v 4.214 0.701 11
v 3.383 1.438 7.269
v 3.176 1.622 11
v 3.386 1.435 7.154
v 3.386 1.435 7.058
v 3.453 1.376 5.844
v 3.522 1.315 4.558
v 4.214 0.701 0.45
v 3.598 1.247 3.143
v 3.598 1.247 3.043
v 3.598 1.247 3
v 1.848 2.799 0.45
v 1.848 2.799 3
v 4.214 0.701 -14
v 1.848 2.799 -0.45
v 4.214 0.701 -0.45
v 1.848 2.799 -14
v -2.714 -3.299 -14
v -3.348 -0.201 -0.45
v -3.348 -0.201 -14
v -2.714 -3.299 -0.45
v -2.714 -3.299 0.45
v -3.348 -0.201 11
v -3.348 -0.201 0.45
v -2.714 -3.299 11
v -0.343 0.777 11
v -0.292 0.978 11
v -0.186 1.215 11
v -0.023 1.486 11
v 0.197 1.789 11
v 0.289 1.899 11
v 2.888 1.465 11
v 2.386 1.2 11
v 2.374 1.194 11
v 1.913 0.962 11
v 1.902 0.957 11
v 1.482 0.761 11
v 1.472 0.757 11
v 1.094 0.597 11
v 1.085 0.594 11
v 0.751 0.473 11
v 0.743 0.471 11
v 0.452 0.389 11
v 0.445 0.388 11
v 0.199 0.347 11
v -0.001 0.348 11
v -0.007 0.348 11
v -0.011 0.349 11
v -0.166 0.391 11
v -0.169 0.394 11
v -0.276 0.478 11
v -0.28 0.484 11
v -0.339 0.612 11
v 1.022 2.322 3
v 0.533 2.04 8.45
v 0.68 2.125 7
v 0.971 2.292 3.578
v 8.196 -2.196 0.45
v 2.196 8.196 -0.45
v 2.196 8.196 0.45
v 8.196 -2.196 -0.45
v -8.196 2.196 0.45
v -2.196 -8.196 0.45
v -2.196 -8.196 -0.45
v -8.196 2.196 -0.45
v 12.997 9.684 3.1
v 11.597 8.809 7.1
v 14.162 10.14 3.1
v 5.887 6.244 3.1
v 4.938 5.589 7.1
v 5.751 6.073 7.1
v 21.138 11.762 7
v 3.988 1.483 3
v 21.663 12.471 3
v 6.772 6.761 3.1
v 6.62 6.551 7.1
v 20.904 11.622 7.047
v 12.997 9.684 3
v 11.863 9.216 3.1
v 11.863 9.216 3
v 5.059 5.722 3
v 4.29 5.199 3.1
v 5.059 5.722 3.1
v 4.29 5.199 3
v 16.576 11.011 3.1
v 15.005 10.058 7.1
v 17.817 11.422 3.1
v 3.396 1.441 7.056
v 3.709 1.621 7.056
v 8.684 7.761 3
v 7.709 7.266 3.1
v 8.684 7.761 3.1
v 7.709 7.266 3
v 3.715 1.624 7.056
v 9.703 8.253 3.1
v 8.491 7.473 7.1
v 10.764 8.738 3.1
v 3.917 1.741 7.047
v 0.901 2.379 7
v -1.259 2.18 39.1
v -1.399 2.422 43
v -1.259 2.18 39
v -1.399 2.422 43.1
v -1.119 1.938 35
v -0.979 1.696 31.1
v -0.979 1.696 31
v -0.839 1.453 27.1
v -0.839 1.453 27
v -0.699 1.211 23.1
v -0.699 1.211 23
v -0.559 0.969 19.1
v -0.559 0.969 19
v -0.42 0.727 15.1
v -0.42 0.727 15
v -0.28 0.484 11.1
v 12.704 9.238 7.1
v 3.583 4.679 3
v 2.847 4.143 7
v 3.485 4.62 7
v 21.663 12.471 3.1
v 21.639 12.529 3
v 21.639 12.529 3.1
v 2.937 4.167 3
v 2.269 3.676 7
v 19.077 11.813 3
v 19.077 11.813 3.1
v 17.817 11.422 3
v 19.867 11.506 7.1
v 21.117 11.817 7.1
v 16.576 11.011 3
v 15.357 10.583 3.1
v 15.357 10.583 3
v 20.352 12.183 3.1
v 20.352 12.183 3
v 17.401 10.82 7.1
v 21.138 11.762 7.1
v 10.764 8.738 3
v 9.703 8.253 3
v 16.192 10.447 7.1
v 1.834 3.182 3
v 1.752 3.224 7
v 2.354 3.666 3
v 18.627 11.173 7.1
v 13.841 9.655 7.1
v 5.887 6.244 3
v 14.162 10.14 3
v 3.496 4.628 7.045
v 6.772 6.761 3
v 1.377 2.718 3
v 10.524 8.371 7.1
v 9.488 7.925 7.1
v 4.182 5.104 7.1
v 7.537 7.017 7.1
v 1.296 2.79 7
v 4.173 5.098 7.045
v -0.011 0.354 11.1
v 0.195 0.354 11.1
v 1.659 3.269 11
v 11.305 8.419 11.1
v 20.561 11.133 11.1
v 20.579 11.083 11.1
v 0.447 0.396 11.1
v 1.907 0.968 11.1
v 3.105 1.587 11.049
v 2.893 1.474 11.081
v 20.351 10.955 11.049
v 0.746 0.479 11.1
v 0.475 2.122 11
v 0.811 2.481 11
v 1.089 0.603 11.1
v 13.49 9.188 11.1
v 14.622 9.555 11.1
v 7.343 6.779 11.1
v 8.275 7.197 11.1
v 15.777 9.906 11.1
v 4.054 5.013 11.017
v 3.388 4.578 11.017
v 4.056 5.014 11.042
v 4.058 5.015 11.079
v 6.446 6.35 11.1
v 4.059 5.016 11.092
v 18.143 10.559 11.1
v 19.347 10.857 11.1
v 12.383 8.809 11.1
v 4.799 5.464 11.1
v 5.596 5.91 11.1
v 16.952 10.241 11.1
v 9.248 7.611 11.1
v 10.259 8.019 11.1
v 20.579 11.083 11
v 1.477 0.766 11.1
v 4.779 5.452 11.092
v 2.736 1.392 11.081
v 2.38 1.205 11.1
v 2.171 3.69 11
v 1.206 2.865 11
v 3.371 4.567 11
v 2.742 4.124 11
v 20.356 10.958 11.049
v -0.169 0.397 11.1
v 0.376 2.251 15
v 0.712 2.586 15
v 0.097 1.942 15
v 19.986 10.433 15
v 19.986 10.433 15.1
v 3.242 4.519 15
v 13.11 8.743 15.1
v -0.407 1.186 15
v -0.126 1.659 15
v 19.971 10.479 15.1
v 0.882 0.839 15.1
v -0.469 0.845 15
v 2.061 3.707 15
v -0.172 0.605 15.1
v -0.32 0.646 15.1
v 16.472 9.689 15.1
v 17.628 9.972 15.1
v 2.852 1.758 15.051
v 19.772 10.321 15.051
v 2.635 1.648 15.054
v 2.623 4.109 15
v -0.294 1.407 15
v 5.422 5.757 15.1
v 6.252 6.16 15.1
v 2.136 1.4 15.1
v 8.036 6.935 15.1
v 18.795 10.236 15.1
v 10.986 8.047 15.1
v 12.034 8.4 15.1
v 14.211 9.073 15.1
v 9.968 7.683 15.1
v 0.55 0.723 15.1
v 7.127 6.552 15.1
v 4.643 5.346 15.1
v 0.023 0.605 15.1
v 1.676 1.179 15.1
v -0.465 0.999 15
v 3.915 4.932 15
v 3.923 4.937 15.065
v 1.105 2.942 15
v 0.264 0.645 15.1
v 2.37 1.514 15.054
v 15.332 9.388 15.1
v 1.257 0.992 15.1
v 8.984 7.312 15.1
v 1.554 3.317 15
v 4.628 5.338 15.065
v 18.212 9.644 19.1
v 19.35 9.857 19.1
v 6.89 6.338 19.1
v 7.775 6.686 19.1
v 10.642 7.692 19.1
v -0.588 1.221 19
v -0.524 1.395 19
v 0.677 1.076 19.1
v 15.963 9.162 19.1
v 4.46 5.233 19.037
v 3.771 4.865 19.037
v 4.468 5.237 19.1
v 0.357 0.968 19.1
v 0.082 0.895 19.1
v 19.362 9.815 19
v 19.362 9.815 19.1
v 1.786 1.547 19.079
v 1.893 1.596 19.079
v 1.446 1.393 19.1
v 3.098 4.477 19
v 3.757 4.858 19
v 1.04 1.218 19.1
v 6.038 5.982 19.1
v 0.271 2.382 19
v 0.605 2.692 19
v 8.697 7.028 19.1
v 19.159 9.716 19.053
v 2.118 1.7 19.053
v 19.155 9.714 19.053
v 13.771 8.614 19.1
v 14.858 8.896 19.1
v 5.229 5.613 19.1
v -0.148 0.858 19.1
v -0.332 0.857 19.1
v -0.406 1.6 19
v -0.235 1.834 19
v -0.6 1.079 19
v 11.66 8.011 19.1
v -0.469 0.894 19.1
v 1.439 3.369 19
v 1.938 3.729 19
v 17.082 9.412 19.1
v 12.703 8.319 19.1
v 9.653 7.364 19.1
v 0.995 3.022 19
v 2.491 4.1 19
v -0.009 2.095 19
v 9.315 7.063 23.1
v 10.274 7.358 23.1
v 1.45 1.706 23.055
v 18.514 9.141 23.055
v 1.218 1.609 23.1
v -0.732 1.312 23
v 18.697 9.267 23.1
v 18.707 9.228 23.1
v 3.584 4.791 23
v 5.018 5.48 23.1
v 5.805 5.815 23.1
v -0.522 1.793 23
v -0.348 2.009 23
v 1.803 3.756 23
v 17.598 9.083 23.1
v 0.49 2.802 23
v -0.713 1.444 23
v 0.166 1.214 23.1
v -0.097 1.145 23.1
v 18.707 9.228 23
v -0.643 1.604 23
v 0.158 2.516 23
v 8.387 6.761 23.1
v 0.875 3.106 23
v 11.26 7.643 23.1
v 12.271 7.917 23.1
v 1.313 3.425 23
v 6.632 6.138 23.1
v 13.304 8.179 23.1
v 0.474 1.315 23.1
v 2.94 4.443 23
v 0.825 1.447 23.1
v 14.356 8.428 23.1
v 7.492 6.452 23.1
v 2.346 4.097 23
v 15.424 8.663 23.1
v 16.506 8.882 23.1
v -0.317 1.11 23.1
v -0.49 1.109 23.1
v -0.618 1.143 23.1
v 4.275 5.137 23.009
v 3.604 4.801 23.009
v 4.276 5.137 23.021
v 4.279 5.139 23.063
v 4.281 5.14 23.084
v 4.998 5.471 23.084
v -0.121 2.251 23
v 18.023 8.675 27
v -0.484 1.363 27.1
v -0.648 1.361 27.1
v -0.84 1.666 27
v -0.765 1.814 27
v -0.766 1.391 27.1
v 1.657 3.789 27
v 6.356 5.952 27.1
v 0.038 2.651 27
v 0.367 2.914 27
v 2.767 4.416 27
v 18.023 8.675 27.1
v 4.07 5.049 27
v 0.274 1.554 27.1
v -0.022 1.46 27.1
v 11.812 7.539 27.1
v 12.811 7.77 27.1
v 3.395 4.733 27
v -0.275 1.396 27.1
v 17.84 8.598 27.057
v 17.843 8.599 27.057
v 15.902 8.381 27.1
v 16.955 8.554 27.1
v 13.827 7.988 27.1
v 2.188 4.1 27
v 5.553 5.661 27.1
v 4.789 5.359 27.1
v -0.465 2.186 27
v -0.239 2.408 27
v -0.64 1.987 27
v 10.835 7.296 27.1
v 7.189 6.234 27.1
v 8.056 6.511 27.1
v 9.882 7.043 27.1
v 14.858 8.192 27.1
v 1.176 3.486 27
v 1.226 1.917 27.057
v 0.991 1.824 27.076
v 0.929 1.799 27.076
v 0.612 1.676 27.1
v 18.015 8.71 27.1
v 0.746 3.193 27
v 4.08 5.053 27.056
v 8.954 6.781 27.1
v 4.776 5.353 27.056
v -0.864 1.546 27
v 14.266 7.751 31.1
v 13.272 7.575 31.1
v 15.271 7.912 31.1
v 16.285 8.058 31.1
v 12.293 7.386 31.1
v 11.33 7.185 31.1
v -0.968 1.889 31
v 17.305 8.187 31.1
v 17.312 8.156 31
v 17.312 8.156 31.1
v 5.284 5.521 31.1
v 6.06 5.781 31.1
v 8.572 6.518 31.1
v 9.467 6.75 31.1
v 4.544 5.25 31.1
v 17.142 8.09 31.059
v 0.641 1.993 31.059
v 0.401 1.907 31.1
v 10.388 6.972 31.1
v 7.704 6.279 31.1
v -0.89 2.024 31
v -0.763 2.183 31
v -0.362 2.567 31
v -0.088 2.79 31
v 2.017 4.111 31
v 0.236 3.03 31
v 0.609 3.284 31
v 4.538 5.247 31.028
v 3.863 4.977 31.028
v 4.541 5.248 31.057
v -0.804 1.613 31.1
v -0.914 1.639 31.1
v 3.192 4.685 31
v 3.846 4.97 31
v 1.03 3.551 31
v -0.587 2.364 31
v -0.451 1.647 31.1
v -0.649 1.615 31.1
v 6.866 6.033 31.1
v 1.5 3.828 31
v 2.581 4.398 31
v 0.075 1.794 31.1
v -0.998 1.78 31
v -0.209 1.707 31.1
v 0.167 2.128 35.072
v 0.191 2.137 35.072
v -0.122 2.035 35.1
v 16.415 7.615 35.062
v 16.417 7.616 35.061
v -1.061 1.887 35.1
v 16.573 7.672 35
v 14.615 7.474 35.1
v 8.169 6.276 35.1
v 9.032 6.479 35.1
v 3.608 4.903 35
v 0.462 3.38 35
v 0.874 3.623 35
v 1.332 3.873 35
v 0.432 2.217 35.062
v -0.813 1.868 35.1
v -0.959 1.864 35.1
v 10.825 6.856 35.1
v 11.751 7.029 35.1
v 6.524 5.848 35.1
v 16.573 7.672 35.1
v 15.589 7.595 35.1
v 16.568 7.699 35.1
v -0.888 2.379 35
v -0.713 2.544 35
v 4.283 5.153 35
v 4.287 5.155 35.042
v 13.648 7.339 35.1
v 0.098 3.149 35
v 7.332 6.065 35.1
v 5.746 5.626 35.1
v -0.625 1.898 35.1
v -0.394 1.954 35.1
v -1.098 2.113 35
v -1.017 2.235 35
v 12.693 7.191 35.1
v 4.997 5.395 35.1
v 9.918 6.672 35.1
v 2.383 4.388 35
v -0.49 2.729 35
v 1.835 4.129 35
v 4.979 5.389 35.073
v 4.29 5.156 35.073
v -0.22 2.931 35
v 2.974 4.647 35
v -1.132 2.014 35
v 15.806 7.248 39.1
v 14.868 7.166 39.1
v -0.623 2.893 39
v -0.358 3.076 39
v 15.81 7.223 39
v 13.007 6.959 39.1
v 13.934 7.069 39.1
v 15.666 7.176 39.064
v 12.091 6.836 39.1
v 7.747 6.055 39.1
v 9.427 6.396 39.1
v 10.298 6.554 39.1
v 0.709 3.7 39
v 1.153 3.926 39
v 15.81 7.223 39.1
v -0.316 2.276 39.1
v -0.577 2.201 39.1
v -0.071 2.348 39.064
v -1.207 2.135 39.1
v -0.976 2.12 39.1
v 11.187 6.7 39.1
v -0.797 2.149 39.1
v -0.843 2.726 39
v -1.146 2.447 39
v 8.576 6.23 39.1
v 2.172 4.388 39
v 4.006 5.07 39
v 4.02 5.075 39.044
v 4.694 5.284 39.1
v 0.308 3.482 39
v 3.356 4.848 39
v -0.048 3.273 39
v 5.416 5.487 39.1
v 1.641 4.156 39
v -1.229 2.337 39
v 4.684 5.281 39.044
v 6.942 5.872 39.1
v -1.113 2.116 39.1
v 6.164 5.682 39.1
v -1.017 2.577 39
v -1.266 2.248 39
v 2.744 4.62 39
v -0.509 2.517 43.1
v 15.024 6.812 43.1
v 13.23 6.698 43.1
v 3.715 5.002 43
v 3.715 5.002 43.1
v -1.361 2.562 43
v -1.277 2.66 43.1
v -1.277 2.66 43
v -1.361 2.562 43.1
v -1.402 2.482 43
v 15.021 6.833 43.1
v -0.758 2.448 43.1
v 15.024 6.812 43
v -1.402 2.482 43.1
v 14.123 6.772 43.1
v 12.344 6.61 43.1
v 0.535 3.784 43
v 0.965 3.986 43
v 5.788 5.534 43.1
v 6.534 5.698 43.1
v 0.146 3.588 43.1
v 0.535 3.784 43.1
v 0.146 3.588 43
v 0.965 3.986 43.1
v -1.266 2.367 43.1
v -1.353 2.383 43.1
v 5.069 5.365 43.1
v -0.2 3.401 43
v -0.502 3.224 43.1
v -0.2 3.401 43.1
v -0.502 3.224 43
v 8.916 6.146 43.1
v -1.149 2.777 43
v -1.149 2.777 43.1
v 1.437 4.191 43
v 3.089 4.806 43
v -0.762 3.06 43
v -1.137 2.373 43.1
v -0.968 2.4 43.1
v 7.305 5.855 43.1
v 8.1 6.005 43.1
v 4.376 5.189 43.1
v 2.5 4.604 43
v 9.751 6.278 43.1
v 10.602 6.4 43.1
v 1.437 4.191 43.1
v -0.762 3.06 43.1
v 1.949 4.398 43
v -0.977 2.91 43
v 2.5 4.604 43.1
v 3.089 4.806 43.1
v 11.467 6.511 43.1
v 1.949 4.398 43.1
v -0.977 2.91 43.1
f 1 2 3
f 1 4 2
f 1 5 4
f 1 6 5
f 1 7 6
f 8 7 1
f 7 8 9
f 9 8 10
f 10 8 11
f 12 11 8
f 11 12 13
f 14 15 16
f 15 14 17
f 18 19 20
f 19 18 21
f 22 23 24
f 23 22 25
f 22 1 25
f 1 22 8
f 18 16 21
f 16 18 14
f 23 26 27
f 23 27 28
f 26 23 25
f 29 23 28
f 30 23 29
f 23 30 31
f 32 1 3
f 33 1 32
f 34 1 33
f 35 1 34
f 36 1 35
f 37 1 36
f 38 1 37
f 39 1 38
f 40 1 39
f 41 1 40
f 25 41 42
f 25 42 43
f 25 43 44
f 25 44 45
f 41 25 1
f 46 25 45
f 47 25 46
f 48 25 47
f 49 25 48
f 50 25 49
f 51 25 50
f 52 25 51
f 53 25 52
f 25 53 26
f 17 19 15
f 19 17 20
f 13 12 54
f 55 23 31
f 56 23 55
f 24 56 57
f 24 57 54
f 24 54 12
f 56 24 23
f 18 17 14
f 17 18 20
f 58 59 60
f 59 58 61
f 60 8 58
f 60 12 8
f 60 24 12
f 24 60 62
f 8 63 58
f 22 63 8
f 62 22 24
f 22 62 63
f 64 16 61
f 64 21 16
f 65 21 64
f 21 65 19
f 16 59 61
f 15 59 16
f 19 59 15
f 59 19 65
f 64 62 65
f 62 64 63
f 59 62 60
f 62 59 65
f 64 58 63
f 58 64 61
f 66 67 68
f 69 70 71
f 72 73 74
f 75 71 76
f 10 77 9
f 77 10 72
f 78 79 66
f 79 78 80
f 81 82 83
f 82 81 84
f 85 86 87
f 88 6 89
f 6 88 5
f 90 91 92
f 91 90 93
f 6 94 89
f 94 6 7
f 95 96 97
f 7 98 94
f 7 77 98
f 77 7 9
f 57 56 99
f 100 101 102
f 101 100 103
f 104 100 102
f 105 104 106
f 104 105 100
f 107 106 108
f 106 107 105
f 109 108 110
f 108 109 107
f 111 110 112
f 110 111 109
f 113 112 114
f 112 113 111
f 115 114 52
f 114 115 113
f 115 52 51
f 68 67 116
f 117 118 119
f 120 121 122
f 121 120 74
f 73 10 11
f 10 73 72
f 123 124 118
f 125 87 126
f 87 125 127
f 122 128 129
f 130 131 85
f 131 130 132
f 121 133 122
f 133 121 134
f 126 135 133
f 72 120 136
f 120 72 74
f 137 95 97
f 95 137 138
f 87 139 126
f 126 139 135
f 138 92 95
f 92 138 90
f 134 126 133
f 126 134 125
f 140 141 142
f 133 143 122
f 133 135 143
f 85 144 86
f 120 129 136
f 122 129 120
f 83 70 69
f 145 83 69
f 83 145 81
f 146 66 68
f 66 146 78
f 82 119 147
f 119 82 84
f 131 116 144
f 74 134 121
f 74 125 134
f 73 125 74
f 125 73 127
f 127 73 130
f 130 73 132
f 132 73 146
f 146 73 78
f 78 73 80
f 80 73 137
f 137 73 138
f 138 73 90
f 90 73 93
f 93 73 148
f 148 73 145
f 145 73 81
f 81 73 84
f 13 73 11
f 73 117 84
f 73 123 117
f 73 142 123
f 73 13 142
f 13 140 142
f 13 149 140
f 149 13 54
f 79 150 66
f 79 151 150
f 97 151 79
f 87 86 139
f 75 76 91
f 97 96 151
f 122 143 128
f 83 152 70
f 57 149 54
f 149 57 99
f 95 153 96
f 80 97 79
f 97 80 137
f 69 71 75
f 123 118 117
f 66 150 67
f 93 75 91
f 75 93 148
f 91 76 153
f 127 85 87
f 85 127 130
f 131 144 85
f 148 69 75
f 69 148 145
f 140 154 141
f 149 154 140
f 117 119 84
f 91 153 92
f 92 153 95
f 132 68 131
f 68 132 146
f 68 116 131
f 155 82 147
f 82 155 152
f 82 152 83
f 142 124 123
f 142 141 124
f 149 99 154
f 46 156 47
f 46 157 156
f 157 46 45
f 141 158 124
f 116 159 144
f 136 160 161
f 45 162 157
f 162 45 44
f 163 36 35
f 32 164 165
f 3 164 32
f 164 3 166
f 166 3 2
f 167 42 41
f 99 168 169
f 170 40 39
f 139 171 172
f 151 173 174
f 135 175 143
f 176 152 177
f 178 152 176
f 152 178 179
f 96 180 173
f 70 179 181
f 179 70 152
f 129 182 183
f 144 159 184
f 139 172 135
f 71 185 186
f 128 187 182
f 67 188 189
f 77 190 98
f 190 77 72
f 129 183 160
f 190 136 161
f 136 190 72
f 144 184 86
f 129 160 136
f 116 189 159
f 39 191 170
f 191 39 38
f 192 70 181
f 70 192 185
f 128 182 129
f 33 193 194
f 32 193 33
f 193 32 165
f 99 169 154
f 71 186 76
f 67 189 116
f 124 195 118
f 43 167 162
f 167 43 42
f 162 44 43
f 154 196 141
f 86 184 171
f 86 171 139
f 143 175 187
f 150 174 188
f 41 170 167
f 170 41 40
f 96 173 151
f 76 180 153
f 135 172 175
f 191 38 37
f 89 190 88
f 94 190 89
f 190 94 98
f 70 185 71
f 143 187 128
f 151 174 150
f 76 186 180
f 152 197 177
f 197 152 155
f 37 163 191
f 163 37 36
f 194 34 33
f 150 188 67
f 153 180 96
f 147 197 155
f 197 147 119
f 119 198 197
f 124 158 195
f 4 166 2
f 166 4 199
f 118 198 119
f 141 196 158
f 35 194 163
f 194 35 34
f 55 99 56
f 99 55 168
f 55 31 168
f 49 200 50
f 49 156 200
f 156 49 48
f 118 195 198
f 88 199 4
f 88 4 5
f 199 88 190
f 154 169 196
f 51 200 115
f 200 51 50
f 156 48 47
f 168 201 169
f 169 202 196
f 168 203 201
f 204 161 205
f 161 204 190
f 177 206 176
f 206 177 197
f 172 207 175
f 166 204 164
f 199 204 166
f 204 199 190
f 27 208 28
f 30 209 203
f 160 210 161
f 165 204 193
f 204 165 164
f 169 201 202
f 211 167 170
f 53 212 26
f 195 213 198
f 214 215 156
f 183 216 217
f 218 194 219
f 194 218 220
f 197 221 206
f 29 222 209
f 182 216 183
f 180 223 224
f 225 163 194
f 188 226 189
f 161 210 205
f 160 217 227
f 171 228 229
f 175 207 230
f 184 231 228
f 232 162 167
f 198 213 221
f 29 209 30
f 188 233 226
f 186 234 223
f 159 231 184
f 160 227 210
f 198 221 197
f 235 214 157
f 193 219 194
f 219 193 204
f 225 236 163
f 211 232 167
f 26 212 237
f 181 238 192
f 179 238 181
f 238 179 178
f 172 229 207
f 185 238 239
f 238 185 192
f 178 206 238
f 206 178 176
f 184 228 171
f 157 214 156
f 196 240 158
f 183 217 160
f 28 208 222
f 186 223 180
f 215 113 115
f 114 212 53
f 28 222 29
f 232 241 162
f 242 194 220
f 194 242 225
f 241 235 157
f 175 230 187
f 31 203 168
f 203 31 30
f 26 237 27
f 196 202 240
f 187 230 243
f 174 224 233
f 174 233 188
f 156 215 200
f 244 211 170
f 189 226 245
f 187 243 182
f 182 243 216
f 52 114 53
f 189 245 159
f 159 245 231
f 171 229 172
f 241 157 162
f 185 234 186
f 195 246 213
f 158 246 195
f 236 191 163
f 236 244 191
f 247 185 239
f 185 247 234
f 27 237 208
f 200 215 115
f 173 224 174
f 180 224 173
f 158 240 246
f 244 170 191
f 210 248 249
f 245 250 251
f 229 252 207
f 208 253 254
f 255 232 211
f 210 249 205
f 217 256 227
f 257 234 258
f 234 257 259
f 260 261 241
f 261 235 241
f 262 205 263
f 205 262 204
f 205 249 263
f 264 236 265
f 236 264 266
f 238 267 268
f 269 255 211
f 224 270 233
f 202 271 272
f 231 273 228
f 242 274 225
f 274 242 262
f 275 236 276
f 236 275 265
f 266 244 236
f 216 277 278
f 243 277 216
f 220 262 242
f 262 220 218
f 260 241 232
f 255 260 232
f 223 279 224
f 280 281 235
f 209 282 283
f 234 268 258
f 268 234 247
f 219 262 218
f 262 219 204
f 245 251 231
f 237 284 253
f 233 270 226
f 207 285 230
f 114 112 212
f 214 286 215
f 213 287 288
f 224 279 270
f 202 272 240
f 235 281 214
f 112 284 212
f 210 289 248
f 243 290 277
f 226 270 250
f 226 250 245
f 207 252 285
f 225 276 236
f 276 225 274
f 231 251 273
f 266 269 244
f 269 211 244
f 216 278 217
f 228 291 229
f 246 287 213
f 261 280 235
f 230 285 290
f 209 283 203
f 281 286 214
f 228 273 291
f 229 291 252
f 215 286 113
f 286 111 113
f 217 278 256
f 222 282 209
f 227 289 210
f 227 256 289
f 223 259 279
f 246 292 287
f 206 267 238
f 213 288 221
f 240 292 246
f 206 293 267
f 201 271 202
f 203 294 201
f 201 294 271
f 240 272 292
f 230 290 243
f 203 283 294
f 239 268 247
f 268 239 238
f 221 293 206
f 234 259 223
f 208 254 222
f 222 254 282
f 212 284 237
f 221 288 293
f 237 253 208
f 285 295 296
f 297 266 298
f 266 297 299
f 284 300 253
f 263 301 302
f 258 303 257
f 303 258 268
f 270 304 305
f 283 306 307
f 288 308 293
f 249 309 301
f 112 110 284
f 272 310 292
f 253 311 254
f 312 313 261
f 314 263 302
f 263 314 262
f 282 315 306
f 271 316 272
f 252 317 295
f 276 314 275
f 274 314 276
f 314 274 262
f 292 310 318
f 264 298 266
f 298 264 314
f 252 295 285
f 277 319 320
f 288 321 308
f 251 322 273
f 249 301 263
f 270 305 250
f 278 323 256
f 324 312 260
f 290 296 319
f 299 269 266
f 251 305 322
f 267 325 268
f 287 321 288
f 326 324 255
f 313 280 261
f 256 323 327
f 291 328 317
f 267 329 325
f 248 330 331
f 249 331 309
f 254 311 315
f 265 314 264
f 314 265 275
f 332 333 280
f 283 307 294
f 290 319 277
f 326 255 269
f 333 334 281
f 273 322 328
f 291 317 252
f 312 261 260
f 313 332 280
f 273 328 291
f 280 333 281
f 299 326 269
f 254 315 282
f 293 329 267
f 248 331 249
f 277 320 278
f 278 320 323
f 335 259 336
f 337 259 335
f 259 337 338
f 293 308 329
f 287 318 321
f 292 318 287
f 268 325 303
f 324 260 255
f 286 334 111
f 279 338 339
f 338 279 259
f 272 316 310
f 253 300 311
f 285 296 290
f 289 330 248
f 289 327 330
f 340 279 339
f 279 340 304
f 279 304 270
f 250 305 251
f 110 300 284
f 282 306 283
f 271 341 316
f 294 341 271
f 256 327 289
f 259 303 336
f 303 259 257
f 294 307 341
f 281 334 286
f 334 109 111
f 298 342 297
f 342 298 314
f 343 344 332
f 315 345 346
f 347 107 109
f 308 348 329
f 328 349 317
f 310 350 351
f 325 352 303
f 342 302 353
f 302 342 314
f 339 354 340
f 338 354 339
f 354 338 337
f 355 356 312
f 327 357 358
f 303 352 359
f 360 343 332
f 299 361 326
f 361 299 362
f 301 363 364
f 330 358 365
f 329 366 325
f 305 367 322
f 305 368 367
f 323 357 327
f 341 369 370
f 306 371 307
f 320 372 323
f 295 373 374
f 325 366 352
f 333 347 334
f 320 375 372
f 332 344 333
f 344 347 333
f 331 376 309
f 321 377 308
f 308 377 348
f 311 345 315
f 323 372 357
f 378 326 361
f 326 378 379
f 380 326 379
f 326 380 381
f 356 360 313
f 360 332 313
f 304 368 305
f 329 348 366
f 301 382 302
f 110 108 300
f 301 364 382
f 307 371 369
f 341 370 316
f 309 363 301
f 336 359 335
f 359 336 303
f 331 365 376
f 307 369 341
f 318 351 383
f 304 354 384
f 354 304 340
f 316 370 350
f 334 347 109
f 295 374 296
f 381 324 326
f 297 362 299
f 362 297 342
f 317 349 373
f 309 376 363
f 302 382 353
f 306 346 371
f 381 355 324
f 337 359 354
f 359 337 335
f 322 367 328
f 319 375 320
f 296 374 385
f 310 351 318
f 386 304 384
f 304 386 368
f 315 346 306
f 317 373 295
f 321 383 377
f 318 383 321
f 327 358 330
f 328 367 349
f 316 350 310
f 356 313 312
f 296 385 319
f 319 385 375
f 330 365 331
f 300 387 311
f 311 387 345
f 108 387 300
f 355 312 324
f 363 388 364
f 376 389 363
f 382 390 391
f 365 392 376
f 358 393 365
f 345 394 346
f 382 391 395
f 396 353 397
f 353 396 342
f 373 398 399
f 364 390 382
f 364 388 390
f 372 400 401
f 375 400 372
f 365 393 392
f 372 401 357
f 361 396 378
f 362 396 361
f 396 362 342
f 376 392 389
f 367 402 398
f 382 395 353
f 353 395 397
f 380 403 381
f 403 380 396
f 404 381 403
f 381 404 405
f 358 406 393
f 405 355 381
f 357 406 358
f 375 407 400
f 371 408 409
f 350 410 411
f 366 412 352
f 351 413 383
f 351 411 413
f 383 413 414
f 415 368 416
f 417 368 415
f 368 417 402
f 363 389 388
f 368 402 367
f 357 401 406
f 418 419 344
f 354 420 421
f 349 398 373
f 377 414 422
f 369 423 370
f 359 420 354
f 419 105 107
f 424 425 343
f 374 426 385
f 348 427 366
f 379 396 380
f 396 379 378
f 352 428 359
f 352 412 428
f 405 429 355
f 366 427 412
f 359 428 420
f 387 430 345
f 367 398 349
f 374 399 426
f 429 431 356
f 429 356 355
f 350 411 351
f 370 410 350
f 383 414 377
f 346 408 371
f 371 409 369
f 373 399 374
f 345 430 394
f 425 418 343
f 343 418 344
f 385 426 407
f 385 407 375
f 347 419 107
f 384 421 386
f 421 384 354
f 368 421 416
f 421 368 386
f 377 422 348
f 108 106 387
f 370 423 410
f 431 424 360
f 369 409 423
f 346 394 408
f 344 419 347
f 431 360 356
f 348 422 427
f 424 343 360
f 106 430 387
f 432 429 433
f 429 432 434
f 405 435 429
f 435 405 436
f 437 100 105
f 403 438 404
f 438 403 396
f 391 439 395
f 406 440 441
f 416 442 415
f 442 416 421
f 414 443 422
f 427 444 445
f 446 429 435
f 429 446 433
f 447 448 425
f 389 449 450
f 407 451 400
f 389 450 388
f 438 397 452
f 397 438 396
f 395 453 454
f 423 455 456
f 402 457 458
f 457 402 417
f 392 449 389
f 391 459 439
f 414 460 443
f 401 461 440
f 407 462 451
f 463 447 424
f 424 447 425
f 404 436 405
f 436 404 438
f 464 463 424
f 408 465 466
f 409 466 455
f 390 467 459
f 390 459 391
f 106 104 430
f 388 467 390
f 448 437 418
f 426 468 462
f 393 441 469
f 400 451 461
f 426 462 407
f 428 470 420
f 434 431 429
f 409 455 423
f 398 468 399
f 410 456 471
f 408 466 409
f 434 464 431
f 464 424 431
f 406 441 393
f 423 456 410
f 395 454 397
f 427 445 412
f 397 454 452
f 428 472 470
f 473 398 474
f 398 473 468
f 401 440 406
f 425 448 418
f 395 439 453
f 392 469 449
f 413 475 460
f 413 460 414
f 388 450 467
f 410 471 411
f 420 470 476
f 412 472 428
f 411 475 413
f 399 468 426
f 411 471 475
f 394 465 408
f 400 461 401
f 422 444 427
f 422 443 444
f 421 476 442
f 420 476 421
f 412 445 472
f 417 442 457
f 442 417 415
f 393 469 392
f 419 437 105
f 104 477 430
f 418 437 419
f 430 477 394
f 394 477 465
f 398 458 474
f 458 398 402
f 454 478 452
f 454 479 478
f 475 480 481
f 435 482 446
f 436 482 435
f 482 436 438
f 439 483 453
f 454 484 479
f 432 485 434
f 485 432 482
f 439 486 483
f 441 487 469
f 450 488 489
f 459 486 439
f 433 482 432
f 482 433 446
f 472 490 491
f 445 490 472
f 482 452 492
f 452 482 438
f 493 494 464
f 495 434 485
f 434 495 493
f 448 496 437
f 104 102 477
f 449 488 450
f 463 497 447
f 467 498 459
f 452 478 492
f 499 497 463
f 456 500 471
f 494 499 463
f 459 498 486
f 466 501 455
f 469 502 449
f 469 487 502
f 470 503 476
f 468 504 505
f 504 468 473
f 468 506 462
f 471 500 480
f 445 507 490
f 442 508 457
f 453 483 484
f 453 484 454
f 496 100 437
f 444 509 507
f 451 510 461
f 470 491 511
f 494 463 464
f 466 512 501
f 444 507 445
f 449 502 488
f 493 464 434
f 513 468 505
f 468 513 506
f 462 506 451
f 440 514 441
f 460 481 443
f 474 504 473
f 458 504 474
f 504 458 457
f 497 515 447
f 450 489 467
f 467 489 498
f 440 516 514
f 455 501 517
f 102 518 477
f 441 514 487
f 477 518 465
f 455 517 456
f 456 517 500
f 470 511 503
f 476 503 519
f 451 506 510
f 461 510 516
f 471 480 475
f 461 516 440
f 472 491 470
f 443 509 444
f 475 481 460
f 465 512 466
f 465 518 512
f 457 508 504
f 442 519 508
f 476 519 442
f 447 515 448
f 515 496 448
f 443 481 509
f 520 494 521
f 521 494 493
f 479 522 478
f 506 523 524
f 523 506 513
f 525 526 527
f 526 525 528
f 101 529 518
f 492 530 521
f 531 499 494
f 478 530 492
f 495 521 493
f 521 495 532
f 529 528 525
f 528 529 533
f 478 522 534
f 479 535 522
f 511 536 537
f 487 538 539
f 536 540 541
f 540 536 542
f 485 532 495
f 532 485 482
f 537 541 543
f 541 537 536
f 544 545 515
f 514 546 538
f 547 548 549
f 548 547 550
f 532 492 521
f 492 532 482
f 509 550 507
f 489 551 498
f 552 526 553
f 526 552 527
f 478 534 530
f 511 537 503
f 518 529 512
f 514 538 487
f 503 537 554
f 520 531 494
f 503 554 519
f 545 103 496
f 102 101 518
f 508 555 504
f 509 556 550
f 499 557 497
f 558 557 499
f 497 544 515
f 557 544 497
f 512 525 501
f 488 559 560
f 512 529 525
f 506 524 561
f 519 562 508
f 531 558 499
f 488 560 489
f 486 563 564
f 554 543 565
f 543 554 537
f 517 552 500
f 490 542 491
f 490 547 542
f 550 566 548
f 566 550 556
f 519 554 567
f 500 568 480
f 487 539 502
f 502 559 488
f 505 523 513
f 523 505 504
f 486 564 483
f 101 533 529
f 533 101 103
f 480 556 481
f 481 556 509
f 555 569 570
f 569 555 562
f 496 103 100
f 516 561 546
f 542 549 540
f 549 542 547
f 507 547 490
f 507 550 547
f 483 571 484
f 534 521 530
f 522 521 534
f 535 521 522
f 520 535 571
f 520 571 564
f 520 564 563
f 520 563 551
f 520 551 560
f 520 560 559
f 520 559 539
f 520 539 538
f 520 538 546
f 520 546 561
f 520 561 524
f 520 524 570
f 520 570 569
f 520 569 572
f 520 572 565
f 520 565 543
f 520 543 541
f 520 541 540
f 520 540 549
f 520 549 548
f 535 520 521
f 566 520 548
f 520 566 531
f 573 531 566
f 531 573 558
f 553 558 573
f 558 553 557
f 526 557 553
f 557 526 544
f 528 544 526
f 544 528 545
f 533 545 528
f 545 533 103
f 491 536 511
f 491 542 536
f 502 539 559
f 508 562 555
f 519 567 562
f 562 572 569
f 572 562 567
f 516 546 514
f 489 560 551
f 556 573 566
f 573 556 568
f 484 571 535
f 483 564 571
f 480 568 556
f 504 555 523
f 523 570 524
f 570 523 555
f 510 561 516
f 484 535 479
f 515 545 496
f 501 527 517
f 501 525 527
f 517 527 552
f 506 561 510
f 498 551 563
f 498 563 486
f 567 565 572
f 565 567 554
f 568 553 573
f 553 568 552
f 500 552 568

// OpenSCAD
// file: ../utils/parametric_helpers.scad
/**
 * @file parametric_helpers.scad
 * @brief Parametric 3D Modeling Utility Library
 * @details Contains shared constants, modules, and functions for geometric arraying,
 *          rounded cylinders, and coordinate transformations.
 * 
 * Copyright (c) 2026 AEGIS-TF1 Systems Development Group.
 */

// Global Constants
PI = 3.14159265358979323846;
GOLDEN_RATIO = 1.618033988749894;
TOLERANCE = 0.05;

// Functions
function deg2rad(d) = d * PI / 180.0;
function rad2deg(r) = r * 180.0 / PI;
function lerp(a, b, t) = a + (b - a) * t;

// Modules

/**
 * @brief Distributes children shapes in a circular array
 * @param n Number of instances
 * @param radius Radius of array circle
 */
module circular_array(n, radius) {
    for (i = [0 : n - 1]) {
        angle = i * 360.0 / n;
        rotate([0, 0, angle])
        translate([radius, 0, 0])
        children();
    }
}

/**
 * @brief Distributes children shapes in a linear array along X-axis
 * @param n Number of instances
 * @param spacing Distance between instances
 */
module linear_array(n, spacing) {
    for (i = [0 : n - 1]) {
        translate([i * spacing, 0, 0])
        children();
    }
}

/**
 * @brief Hollow cylinder (tube) along Z-axis
 * @param h Tube height
 * @param outer_r Outer radius
 * @param inner_r Inner radius
 * @param fn Resolution
 */
module tube(h, outer_r, inner_r, fn=64) {
    difference() {
        cylinder(h=h, r=outer_r, center=true, $fn=fn);
        cylinder(h=h + TOLERANCE * 2.0, r=inner_r, center=true, $fn=fn);
    }
}

/**
 * @brief Torus shape centered at origin
 * @param R Major radius (ring center distance)
 * @param r Minor radius (cross section radius)
 * @param fn Resolution
 */
module torus(R, r, fn=64) {
    rotate_extrude($fn=fn)
    translate([R, 0, 0])
    circle(r=r, $fn=fn);
}

/**
 * @brief Rounded cylinder (filleted top and bottom edges) using Minkowski
 * @param h Height
 * @param r Radius
 * @param fillet_r Edge radius
 * @param fn Resolution
 */
module rounded_cylinder(h, r, fillet_r, fn=64) {
    minkowski() {
        cylinder(h = h - 2.0 * fillet_r, r = r - fillet_r, center = true, $fn = fn);
        sphere(r = fillet_r, $fn = fn);
    }
}

/**
 * @brief 2D fillet helper
 * @param r Fillet radius
 */
module fillet_2d(r) {
    difference() {
        square([r, r]);
        translate([r, r])
        circle(r=r, $fn=64);
    }
}

/**
 * @brief 2D chamfer helper
 * @param size Chamfer length
 */
module chamfer_2d(size) {
    polygon(points=[[0,0], [size,0], [0,size]]);
}

/**
 * @brief Ball bearing assembly (inner ring, outer ring, balls)
 */
module bearing_assembly(inner_dia, outer_dia, width, num_balls=10) {
    color("silver")
    difference() {
        // Outer ring
        cylinder(h=width, r=outer_dia / 2.0, center=true, $fn=64);
        cylinder(h=width + 1.0, r=(outer_dia + inner_dia)/4.0 + (outer_dia - inner_dia)/8.0 * 0.8, center=true, $fn=64);
    }
    color("silver")
    difference() {
        // Inner ring
        cylinder(h=width, r=(outer_dia + inner_dia)/4.0 - (outer_dia - inner_dia)/8.0 * 0.8, center=true, $fn=64);
        cylinder(h=width + 1.0, r=inner_dia / 2.0, center=true, $fn=64);
    }
    // Balls (arranged in circular array)
    color([0.9, 0.92, 0.95]) // Chrome steel bearing balls
    let (ball_radius = (outer_dia - inner_dia) / 8.0, pitch_radius = (outer_dia + inner_dia) / 4.0) {
        circular_array(n=num_balls, radius=pitch_radius)
        sphere(r=ball_radius * 0.95, $fn=32);
    }
}

/**
 * @brief Bolted assembly flange with hexagonal head bolts
 */
module bolted_flange(outer_r, inner_r, thickness, num_bolts=16, bolt_r=2.5) {
    color("darkgray")
    difference() {
        // Flange ring
        cylinder(h=thickness, r=outer_r, center=true, $fn=128);
        cylinder(h=thickness + 1.0, r=inner_r, center=true, $fn=128);
        
        // Bolt holes
        circular_array(n=num_bolts, radius=(outer_r + inner_r)/2.0)
        cylinder(h=thickness + 2.0, r=bolt_r, center=true, $fn=16);
    }
    // Hexagonal bolts
    color([0.72, 0.73, 0.75]) // Hardened steel zinc-plated bolts
    circular_array(n=num_bolts, radius=(outer_r + inner_r)/2.0)
    translate([0, 0, thickness/2.0])
    cylinder(h=bolt_r * 1.5, r=bolt_r * 1.6, center=false, $fn=6);
}

/**
 * @brief Dovetail slot profile shape for cutting blade roots
 */
module dovetail_slot_profile(width, height) {
    polygon(points=[
        [-width * 0.76 / 2.0, height/2.0],
        [width * 0.76 / 2.0, height/2.0],
        [width/2.0, -height/2.0],
        [-width/2.0, -height/2.0]
    ]);
}

/*
// Preview Examples
translate([0, 0, 0]) {
    // Tube example
    color("teal") tube(h=30, outer_r=15, inner_r=12);
    
    // Torus example
    translate([45, 0, 0])
    color("crimson") torus(R=20, r=4);

    // Rounded Cylinder example
    translate([-45, 0, 0])
    color([0.75, 0.65, 0.4]) rounded_cylinder(h=25, r=10, fillet_r=2.0);

    // Bearing example
    translate([0, 45, 0])
    bearing_assembly(inner_dia=20, outer_dia=40, width=12);

    // Bolted Flange example
    translate([0, -45, 0])
    bolted_flange(outer_r=30, inner_r=20, thickness=6, num_bolts=12);
}
*/
// file: ../utils/airfoil_profiles.scad
/**
 * @file airfoil_profiles.scad
 * @brief NACA 4-digit Airfoil Profile Generator
 * @details Computes camber lines and thickness coordinates for compressor and turbine blades.
 * 
 * Copyright (c) 2026 AEGIS-TF1 Systems Development Group.
 */

// Generate x coordinates spacing from 0 to chord
function airfoil_x_coords(chord, n) = [ for (i = [0 : n]) chord * (1.0 - cos(i * 90.0 / n)) ];

// Standard NACA thickness distribution
function naca_thickness(x, chord, max_t) = 
    let (
        xc = x / chord,
        a0 = 0.2969,
        a1 = -0.1260,
        a2 = -0.3516,
        a3 = 0.2843,
        a4 = -0.1015,
        term = a0 * sqrt(xc) + a1 * xc + a2 * pow(xc, 2) + a3 * pow(xc, 3) + a4 * pow(xc, 4)
    )
    (max_t / 0.2) * chord * term;

// NACA Camber line (m = max camber, p = position of max camber, c = chord)
function naca_camber(x, chord, m, p) =
    (x < p * chord) ?
    (m * (x / pow(p, 2.0)) * (2.0 * p - (x / chord))) :
    (m * ((chord - x) / pow(1.0 - p, 2.0)) * (1.0 + (x / chord) - 2.0 * p));

// Camber line derivative/slope angle (theta)
function naca_camber_slope(x, chord, m, p) =
    let (
        dy_dx = (x < p * chord) ?
                ((2.0 * m) / pow(p, 2.0)) * (p - (x / chord)) :
                ((2.0 * m) / pow(1.0 - p, 2.0)) * (p - (x / chord))
    )
    atan(dy_dx);

// Calculate upper and lower coordinates
function naca_profile_points(chord, max_t, m, p, n=30) =
    let (
        x_vals = airfoil_x_coords(chord, n),
        upper_pts = [ for (i = [0 : n]) 
            let (
                x = x_vals[i],
                yt = naca_thickness(x, chord, max_t),
                yc = naca_camber(x, chord, m, p),
                theta = naca_camber_slope(x, chord, m, p)
            )
            [x - yt * sin(theta), yc + yt * cos(theta)]
        ],
        lower_pts = [ for (i = [n : -1 : 0]) 
            let (
                x = x_vals[i],
                yt = naca_thickness(x, chord, max_t),
                yc = naca_camber(x, chord, m, p),
                theta = naca_camber_slope(x, chord, m, p)
            )
            [x + yt * sin(theta), yc - yt * cos(theta)]
        ]
    )
    concat(upper_pts, lower_pts);

/**
 * @brief Extrudes a 2D NACA airfoil into 3D
 * @param chord Blade chord (length)
 * @param span Blade span (height)
 * @param max_t Maximum thickness ratio (e.g. 0.12)
 * @param camber Maximum camber ratio (e.g. 0.04)
 * @param camber_pos Position of maximum camber ratio (e.g. 0.40)
 */
module naca_airfoil_solid(chord, span, max_t, camber, camber_pos, n=20) {
    pts = naca_profile_points(chord, max_t, camber, camber_pos, n);
    linear_extrude(height=span, center=true)
    polygon(points=pts);
}

// Evaluates a cubic Bezier curve in 2D or 3D at parameter t (0 <= t <= 1)
function bezier_eval(p0, p1, p2, p3, t) = 
    (1.0 - t)*(1.0 - t)*(1.0 - t)*p0 + 
    3.0*(1.0 - t)*(1.0 - t)*t*p1 + 
    3.0*(1.0 - t)*t*t*p2 + 
    t*t*t*p3;

// Generates a list of n points along a cubic Bezier curve
function bezier_curve_points(p0, p1, p2, p3, n=15) = 
    [ for (i = [0 : n]) bezier_eval(p0, p1, p2, p3, i / n) ];

// Preview
color("cornflowerblue")
naca_airfoil_solid(chord=40, span=60, max_t=0.12, camber=0.04, camber_pos=0.4);
// main file
/**
 * @file compressor_blade.scad
 * @brief Compressor Blade Geometry Generator
 * @details Models a single twisted compressor blade with a dovetail attachment root.
 * 
 * Copyright (c) 2026 AEGIS-TF1 Systems Development Group.
 */

use <../utils/airfoil_profiles.scad>
use <../utils/parametric_helpers.scad>

module dovetail_root(width, height, length, show_fea=false) {
    // Standard dovetail slot connector
    translate([0, 0, -height/2.0])
    difference() {
        union() {
            // Dovetail shape: flared base
            color(show_fea ? [0.9, 0.1, 0.1] : [0.72, 0.73, 0.75]) // Red for FEA stress concentration
            linear_extrude(height=length, center=true)
            polygon(points=[
                [-width/2.0, -height/2.0],
                [width/2.0, -height/2.0],
                [width * 0.75 / 2.0, height/2.0],
                [-width * 0.75 / 2.0, height/2.0]
            ]);
            // platform base plate
            translate([0, 0, height/2.0])
            color(show_fea ? [0.9, 0.5, 0.1] : [0.65, 0.65, 0.67]) // Orange for platform stress
            cube([width * 1.5, width * 1.5, height * 0.3], center=true);
        }
    }
}

module blade_body(chord, span, twist, root_t_ratio, tip_t_ratio, camber, camber_pos, lean_angle, scale_factor, is_blisk=false, show_fea=false) {
    slices = 10;
    dz = span / slices;
    
    color(show_fea ? [0.15, 0.7, 0.2] : [0.8, 0.82, 0.85])
    for (i = [0 : slices-1]) {
        z1 = i * dz;
        z2 = (i + 1) * dz;
        
        t1 = root_t_ratio + (tip_t_ratio - root_t_ratio) * (i / slices);
        t2 = root_t_ratio + (tip_t_ratio - root_t_ratio) * ((i + 1) / slices);
        
        s1 = 1.0 - (1.0 - scale_factor) * (i / slices);
        s2 = 1.0 - (1.0 - scale_factor) * ((i + 1) / slices);
        
        rot1 = -twist * (i / slices);
        rot2 = -twist * ((i + 1) / slices);
        
        // Bezier S-sweep & lean curve for Stage 0 Fan (Blisk)
        p0 = [0.0, 0.0];
        p1 = [0.0, 2.0];
        p2 = [chord * 0.15, 5.0];
        p3 = [chord * 0.35, 9.0]; // organic forward sweep and lean at tip
        
        pos1 = (is_blisk) ? bezier_eval(p0, p1, p2, p3, i / slices) : [0.0, z1 * tan(lean_angle)];
        pos2 = (is_blisk) ? bezier_eval(p0, p1, p2, p3, (i + 1) / slices) : [0.0, z2 * tan(lean_angle)];
        
        sweep_x1 = pos1[0];
        lean_y1  = pos1[1];
        sweep_x2 = pos2[0];
        lean_y2  = pos2[1];
        
        hull() {
            translate([sweep_x1, lean_y1, z1])
            rotate([0, 0, rot1])
            scale([s1, s1, 1])
            linear_extrude(height=0.1)
            polygon(points=naca_profile_points(chord=chord, max_t=t1, m=camber, p=camber_pos, n=30));
            
            translate([sweep_x2, lean_y2, z2])
            rotate([0, 0, rot2])
            scale([s2, s2, 1])
            linear_extrude(height=0.1)
            polygon(points=naca_profile_points(chord=chord, max_t=t2, m=camber, p=camber_pos, n=30));
        }
    }
}

/**
 * @brief Single compressor blade with twist, linear thickness taper, lean angle and dovetail root
 * @param chord Chord width (mm)
 * @param span Blade height (mm)
 * @param stagger_angle Base rotation angle (deg)
 * @param twist Total twist angle top-to-bottom (deg)
 * @param thickness_ratio Thickness relative to chord (e.g. 0.08) - fallback/default
 * @param is_blisk Enable blended fillet root (no dovetail platform)
 * @param show_fea Enable FEA stress heatmap coloring
 * @param lean_angle Angle of lean in degrees (def 4)
 * @param root_thickness_ratio Thickness ratio at the blade root (def 0.12)
 * @param tip_thickness_ratio Thickness ratio at the blade tip (def 0.06)
 */
module compressor_blade(chord=25, span=40, stagger_angle=30, twist=15, thickness_ratio=0.08, is_blisk=false, show_fea=false, lean_angle=4, root_thickness_ratio=0.12, tip_thickness_ratio=0.06) {
    root_width = 8;
    platform_h = 3;
    
    // Use thickness_ratio to scale the default root/tip thickness if default was changed by caller
    actual_root_t = (thickness_ratio != 0.08) ? thickness_ratio * (0.12 / 0.08) : root_thickness_ratio;
    actual_tip_t = (thickness_ratio != 0.08) ? thickness_ratio * (0.06 / 0.08) : tip_thickness_ratio;

    if (is_blisk) {
        // 1. Blended fillet transition collar for Integrally Bladed Rotor (Blisk)
        color(show_fea ? [0.9, 0.5, 0.1] : [0.7, 0.72, 0.75])
        translate([0, 0, 0])
        cylinder(h=2.2, r1=root_width * 1.0, r2=root_width * 0.65, center=false, $fn=16);
        
        // 2. Highly curved, swept Blisk blade body (e.g. Stage 0 Front Fan)
        translate([0, 0, 1.8])
        rotate([0, 0, stagger_angle])
        blade_body(chord=chord, span=span, twist=twist, root_t_ratio=actual_root_t, tip_t_ratio=actual_tip_t, camber=0.06, camber_pos=0.4, lean_angle=lean_angle, scale_factor=0.52, is_blisk=true, show_fea=show_fea);
    } else {
        // 1. Dovetail connector at base
        translate([0, 0, 0])
        rotate([0, 0, stagger_angle])
        dovetail_root(width=root_width, height=platform_h, length=chord, show_fea=show_fea);

        // 2. Twisted Blade body with lean and thickness taper
        translate([0, 0, platform_h])
        rotate([0, 0, stagger_angle])
        blade_body(chord=chord, span=span, twist=twist, root_t_ratio=actual_root_t, tip_t_ratio=actual_tip_t, camber=0.04, camber_pos=0.4, lean_angle=lean_angle, scale_factor=0.68, is_blisk=false, show_fea=show_fea);
    }
}

// Preview
color("lightsteelblue")
compressor_blade();
